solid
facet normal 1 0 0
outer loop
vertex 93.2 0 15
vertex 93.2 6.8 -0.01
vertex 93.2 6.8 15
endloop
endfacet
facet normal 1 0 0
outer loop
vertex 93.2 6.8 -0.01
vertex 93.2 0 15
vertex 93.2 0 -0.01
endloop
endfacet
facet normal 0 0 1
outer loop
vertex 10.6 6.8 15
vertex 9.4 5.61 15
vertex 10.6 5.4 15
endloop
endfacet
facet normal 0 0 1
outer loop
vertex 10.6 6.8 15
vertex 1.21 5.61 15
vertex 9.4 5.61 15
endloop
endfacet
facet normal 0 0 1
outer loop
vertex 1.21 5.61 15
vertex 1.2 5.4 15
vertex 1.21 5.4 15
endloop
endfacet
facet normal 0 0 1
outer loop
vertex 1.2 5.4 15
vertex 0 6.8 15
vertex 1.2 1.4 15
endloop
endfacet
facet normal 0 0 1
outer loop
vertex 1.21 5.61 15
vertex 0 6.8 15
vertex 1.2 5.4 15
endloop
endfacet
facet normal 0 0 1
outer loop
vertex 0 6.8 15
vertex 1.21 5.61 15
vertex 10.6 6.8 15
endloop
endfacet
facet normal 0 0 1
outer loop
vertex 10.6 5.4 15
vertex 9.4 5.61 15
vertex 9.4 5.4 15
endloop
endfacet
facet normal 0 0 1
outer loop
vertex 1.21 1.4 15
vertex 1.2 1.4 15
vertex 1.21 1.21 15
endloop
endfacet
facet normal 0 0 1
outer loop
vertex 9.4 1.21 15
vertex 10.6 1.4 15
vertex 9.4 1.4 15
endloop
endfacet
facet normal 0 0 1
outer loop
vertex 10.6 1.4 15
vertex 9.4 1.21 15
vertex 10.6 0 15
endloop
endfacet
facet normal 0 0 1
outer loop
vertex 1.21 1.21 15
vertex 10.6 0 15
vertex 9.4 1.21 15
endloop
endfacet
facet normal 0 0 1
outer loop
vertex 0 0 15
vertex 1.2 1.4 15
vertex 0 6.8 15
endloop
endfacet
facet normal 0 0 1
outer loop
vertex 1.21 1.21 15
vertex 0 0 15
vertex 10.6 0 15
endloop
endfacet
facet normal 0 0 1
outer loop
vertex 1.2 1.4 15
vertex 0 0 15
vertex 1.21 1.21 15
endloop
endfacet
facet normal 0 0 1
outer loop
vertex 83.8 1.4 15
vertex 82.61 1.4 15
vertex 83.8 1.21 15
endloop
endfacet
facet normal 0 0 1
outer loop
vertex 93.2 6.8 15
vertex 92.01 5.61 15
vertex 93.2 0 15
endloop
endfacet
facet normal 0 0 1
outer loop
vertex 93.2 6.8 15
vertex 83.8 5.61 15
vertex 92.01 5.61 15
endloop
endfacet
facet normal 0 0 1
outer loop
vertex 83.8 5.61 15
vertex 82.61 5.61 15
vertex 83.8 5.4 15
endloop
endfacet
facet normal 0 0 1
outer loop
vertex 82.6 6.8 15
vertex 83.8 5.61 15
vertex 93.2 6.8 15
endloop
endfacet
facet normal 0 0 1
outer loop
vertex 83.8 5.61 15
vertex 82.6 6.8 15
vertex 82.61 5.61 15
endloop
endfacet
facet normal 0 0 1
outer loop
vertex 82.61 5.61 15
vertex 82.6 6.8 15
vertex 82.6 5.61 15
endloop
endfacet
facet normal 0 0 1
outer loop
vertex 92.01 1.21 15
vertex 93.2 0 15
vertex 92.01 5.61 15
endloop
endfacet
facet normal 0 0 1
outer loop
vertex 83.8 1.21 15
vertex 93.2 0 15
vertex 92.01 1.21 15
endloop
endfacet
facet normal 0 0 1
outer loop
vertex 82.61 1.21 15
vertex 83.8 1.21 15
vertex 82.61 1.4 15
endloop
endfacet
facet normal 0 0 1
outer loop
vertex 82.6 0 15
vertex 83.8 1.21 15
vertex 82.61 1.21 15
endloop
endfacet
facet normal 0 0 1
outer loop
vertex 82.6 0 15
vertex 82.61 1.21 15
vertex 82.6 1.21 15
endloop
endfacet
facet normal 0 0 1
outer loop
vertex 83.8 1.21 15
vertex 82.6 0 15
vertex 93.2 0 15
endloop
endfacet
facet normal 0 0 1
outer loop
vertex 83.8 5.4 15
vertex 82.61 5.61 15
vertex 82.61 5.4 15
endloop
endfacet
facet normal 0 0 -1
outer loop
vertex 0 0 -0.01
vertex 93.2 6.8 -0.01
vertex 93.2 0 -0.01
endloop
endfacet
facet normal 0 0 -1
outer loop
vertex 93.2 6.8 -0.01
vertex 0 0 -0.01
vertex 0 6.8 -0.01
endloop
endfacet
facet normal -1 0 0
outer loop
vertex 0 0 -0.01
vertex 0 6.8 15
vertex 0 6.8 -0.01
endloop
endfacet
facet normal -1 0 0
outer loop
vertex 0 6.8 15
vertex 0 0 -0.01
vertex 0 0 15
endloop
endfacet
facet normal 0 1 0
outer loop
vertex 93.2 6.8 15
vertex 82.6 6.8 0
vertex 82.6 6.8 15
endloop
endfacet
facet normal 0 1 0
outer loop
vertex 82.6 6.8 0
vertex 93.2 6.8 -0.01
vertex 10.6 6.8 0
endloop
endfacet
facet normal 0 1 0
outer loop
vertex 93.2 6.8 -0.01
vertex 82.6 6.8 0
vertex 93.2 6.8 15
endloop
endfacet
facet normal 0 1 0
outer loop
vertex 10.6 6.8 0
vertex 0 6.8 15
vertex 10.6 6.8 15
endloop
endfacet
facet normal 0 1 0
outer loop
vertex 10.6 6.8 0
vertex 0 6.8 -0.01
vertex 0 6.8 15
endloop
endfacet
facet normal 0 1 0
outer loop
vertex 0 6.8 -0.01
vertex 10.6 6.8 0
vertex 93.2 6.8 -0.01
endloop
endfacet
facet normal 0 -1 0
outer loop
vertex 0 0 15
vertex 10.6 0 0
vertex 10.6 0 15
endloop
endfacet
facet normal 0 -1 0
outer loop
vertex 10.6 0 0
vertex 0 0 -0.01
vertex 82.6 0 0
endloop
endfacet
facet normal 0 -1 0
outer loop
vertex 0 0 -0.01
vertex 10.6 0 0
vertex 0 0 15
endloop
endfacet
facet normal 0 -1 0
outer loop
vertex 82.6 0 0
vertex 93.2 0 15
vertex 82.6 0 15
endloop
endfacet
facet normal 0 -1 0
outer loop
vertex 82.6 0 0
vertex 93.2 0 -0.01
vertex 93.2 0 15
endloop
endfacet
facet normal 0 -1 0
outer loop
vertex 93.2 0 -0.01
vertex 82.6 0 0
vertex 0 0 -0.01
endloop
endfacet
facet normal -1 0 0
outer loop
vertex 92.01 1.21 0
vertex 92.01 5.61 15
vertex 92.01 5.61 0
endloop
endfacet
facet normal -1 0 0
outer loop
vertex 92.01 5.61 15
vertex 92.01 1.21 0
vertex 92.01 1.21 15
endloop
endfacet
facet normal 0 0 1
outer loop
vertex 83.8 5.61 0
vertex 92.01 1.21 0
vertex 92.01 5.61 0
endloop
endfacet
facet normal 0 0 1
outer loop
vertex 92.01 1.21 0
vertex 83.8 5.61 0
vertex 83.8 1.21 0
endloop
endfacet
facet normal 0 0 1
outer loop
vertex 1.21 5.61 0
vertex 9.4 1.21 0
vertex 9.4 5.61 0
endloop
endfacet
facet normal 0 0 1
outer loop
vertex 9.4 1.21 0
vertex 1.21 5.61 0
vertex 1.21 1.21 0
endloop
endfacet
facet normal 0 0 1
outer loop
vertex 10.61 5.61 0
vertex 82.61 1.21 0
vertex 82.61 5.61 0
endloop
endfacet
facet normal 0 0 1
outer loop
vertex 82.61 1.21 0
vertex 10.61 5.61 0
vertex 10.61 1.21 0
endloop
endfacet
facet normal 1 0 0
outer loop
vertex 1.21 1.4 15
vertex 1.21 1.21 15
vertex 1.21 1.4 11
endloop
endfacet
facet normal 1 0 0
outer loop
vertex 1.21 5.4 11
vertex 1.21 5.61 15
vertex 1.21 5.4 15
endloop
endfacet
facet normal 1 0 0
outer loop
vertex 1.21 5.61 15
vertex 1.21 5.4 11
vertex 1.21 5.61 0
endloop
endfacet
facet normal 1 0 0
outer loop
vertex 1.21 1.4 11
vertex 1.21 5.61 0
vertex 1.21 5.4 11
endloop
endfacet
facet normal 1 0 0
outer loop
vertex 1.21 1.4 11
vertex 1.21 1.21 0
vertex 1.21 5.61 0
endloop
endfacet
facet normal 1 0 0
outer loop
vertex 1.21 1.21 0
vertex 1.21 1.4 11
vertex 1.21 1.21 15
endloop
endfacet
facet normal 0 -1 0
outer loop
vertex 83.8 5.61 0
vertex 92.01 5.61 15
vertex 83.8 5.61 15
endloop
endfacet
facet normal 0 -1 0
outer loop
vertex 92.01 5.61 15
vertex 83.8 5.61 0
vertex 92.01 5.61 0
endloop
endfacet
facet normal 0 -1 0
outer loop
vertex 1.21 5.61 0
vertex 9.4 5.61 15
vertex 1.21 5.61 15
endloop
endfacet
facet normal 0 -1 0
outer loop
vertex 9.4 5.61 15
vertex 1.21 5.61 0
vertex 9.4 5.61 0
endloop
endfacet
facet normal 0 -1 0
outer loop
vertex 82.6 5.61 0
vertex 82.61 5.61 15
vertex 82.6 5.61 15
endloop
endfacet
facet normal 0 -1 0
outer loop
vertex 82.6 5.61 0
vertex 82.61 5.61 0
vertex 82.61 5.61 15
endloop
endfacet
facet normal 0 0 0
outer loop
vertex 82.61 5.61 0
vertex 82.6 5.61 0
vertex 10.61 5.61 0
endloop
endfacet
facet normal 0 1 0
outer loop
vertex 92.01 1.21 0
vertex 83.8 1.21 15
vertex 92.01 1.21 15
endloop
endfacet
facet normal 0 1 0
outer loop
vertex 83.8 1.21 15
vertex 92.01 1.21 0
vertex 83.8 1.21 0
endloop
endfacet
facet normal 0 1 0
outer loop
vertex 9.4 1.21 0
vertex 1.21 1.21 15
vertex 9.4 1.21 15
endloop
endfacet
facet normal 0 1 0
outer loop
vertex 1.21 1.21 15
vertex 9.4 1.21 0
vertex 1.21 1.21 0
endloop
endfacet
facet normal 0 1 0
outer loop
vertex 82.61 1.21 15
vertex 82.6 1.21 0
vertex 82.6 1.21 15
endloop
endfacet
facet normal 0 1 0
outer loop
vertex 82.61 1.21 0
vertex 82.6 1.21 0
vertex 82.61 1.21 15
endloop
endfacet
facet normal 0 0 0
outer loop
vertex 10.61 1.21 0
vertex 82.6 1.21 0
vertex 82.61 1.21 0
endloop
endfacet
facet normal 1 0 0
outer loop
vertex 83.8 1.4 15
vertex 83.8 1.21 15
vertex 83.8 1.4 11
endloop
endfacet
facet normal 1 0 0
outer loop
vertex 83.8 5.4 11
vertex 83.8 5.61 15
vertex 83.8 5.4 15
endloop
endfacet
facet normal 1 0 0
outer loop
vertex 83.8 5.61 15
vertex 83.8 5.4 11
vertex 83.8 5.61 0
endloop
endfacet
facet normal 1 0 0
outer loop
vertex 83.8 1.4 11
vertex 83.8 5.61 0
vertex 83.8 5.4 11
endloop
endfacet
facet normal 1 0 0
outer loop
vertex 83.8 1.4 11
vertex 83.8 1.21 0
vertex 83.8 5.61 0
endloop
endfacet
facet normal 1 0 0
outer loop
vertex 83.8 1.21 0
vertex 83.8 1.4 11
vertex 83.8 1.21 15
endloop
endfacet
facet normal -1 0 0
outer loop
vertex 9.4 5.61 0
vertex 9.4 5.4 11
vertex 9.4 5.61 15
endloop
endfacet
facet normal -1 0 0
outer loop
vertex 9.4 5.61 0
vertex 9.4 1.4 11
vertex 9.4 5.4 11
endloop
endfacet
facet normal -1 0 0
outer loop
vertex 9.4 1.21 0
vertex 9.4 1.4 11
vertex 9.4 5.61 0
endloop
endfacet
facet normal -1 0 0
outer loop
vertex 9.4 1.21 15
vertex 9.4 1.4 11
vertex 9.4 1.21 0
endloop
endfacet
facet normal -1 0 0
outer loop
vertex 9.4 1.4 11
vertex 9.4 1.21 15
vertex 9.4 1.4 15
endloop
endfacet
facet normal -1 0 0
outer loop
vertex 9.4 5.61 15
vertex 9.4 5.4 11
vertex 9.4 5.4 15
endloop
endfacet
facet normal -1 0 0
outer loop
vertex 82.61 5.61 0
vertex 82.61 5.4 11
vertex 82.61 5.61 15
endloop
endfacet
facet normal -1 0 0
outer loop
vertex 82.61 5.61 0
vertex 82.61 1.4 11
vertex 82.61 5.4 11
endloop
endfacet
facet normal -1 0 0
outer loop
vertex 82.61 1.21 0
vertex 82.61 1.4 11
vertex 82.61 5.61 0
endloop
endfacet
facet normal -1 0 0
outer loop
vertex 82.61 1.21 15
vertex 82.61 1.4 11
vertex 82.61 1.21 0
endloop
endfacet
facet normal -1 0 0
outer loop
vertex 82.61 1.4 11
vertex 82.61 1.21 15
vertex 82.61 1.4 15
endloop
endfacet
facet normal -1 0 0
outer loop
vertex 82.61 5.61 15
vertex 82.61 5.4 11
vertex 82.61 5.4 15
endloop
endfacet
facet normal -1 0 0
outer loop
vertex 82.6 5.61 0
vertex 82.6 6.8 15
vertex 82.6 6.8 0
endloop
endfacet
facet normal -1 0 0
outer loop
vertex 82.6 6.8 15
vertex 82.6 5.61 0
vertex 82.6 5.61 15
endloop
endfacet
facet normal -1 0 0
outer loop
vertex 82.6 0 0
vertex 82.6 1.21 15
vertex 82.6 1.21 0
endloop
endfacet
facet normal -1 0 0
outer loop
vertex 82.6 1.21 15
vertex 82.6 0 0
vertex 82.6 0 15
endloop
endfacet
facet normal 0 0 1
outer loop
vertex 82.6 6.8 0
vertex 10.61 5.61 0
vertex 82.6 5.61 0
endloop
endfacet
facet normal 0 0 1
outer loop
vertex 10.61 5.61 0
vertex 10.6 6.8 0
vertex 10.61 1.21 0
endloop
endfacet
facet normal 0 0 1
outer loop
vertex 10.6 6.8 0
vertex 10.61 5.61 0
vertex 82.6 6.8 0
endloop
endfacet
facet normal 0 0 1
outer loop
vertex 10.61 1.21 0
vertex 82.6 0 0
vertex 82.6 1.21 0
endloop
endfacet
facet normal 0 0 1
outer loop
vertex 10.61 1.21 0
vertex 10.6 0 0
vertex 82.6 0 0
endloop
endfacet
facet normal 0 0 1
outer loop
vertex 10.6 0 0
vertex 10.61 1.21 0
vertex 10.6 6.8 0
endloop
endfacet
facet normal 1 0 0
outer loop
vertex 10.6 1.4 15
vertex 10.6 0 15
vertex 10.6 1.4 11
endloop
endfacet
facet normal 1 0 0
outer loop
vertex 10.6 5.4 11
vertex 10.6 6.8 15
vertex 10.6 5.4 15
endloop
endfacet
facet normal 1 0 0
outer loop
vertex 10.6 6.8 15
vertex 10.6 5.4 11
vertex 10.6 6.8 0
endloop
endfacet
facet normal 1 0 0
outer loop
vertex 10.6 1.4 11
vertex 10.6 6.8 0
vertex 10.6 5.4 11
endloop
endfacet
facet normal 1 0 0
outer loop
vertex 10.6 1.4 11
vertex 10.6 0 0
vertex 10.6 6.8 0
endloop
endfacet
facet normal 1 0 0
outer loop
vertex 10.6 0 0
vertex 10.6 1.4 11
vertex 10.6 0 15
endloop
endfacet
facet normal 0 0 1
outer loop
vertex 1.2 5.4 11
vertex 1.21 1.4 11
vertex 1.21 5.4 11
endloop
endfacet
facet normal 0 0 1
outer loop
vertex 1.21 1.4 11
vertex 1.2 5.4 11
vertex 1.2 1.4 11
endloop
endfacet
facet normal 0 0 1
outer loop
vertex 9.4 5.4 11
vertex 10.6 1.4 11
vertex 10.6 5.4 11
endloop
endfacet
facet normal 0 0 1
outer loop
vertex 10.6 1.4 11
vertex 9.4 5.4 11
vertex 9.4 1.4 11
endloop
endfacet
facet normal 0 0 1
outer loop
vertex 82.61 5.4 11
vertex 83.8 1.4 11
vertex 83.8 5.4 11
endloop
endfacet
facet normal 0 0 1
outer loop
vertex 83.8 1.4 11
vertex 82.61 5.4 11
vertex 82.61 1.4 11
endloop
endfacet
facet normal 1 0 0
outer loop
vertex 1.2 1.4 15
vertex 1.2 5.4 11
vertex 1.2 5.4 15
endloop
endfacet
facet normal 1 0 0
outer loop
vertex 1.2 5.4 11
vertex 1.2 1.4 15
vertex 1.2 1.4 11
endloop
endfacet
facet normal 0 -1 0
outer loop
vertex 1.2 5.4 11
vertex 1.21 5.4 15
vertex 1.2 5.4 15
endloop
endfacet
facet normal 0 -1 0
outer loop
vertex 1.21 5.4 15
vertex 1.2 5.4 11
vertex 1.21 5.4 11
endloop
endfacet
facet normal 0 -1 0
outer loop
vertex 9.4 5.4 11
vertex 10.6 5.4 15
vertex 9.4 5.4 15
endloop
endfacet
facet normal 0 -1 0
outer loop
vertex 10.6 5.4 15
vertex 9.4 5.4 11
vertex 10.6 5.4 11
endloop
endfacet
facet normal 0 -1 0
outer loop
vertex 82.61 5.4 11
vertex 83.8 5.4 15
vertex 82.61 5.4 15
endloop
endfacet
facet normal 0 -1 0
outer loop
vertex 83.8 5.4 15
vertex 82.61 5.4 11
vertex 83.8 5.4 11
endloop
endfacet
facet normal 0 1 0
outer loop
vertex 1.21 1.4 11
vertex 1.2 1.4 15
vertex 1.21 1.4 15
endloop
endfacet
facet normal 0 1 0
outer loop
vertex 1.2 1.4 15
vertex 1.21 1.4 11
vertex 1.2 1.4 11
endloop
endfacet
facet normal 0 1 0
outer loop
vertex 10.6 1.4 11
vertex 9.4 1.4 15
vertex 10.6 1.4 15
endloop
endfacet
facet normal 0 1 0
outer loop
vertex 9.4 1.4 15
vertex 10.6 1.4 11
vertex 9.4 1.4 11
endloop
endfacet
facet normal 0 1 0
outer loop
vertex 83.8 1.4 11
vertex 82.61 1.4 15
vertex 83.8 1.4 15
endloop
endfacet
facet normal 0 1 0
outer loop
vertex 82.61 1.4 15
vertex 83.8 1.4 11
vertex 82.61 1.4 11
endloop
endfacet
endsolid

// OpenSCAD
// file: ../Base/Boxes.scad
// Fischertechnik Box Foundation
// Pre-designed Boxes

use <Constants.scad>

include <PlacementOptions.scad>

box190Width = 190;
box190Depth = 130;
box130Width = 130;
box130Depth = 95;

// Values are from an original ec3 box
topBottomDifference = 1.5;
outerHeight = 40;
innerHeight = 38.2;
baseThickness = outerHeight - innerHeight;
stackExcess = 5.7;
radius = 3.5;
wallThickness = 1.5;
tolerance = 0.2;
stackOffset = innerHeight - stackExcess;

boxUsageHeight = stackOffset;
boxWallThickness = wallThickness;
boxBaseThickness = baseThickness;
boxWebWidth = 3.0;

// getBoxWallThickness()
// Gets the wall thickness of a Fischertechnik Box
function getBoxWallThickness() = boxWallThickness;

// getBoxUsageHeight()
// Gets the usable height of a Fischertechnik box
function getBoxUsageHeight() = boxUsageHeight;

// getBoxInnerHeight()
// Gets the inner height of a Fischertechnik box, including the stack excess
function getBoxInnerHeight() = innerHeight;

// getBoxBaseThickness()
// Gets the thickness of the Fischertechnik box base.
function getBoxBaseThickness() = boxBaseThickness;

// getBoxWebWidth()
// Gets the width of a box web
function getBoxWebWidth() = boxWebWidth;

// getBox190Space()
// Gets the usable inner space of a Box 190 as an x/y-list
function getBox190Space() = [
    box190Width - 2*getBoxWallThickness() - topBottomDifference, 
    box190Depth - 2*getBoxWallThickness() - topBottomDifference ];

// BoxBase(width, depth)
// Creates an empty stackable Fischertechnik compatible box
// width = Outer width of the box (190, 130, ...)
// depth = Outer depth of the box (130, 95, ...)

module BoxBase(width, depth, height=outerHeight) {    
    thinPlate = 0.01;

    innerHeight = height - baseThickness;    
    
    module BodyPlate(width, depth) {
        translate([radius, radius])
        hull() {
            w = width-2*radius;
            d = depth-2*radius;
            cube([w, d, thinPlate]);
            cylinder(thinPlate, r=radius, $fn=getFragments());
            translate([w, 0])
                cylinder(thinPlate, r=radius, $fn=getFragments());
            translate([w, d])
                cylinder(thinPlate, r=radius, $fn=getFragments());
            translate([0, d])
                cylinder(thinPlate, r=radius, $fn=getFragments());
        }
    }
    
    module Body(tolerance=tolerance) {
        hull() {
            // Bottom with tolerance to fit into the original boxes when stacked
            translate([-wallThickness+tolerance, -wallThickness+tolerance, -baseThickness])
                BodyPlate(width-topBottomDifference-2*tolerance, depth-topBottomDifference-2*tolerance);
            
            // Top
            translate([-wallThickness-topBottomDifference/2, -wallThickness-topBottomDifference/2, innerHeight-thinPlate])
                BodyPlate(width, depth);
         }
    }

    module Cutoff() {
        hull() {
            coWidth = width - 2*wallThickness;
            coDepth = depth - 2*wallThickness;
            
            // Bottom
            BodyPlate(coWidth-topBottomDifference, coDepth-topBottomDifference);

            // Top
            translate([-topBottomDifference/2, -topBottomDifference/2, innerHeight+thinPlate]) 
                BodyPlate(coWidth, coDepth);
        }
    }
    
    difference() {        
        Body();
        Cutoff();
        stackOffset = innerHeight - stackExcess;
        translate([0, 0, stackOffset + baseThickness])
            Body(tolerance=0);
    }
}

// Creates the Fischertechnik empty box 130x190 mm and places it at position 0,0
// 190x130 are the outer sizes, the inner space is slightly smaller. Use getBox190Space() to get the inner sizes.
// The box is positioned that the usable inner space is at the 0,0,0 position. The

module Box190() {
    BoxBase(box190Width, box190Depth);
}

// Gets the usable inner space of a Box 130 as an x/y-list
function getBox130Space() = [
    box130Width - 2*getBoxWallThickness() - topBottomDifference, 
    box130Depth - 2*getBoxWallThickness() - topBottomDifference ];

// Creates the Fischertechnik empty box 95x130 mm and places it at position 0,0
// 190x130 are the outer sizes, the inner space is slightly smaller. Use getBox190Space() to get the inner sizes.
// The box is positioned that the usable inner space is at the 0,0,0 position. The

module Box130() {
    BoxBase(box130Width, box130Depth);
}

// Creates a web at the specified box walls
// corner 0 = LowerLeft, 1 = UpperLeft, 2 = UpperRight, 3 = LowerRight
// side 0 = LeftOfCorner, 1 = RightOfCorner
// distance = Distance in mm from the corner
// boxSpace = inner width and depth of the box (default: Box 190)
// webWidth = length of the web (default is 3 mms)
// webThickness = thickness of the web (default is 1 mm)

module BoxWeb(corner, side, distance, boxSpace=getBox190Space(), webWidth=getBoxWebWidth(), webThickness=1.0) {
    sink = getBoxWallThickness()/2;

    width = (corner % 2 == 0) ? 
            (side == LeftOfCorner ? webWidth : webThickness) :
            (side == LeftOfCorner ? webThickness : webWidth);

    depth = (corner % 2 == 0) ? 
            (side == RightOfCorner ? webWidth : webThickness) :
            (side == RightOfCorner ? webThickness : webWidth);
    
    xDiff = corner == LowerLeft ? 
                (side == LeftOfCorner ? -sink : distance) :
            (corner == UpperLeft ?                
                (side == LeftOfCorner ? distance : -sink) :
            (corner == UpperRight ?
                (side == LeftOfCorner ? boxSpace.x-webWidth+sink : boxSpace.x-distance-webThickness) :
                (side == LeftOfCorner ? boxSpace.x-distance-webThickness: boxSpace.x-webWidth+sink)));

    yDiff = corner == LowerLeft ? 
                (side == RightOfCorner ? -sink : distance) :
            (corner == UpperLeft ?
                (side == RightOfCorner ? boxSpace.y-distance : boxSpace.y-webWidth+sink) :
            (corner == UpperRight ?
                (side == RightOfCorner ? boxSpace.y-webWidth+sink : boxSpace.y-distance) :
                (side == RightOfCorner ? distance : -sink)));
    
    translate([xDiff, yDiff, -getExcess()])
        cube([width, depth, boxUsageHeight + 2*getExcess()]);
}
// file: ../Base/Rotation.scad
// Fischertechnik Box Foundation
// Geometry Helpers Rotation

include <PlacementOptions.scad>

// getRotatedSpace(space, rotation=NoRotation)
// Rotates the space dependent on the specified rotation

function getRotatedSpace(space, rotation=NoRotation) = [
    (rotation == Rotate90 || rotation == Rotate270) ? space.y : space.x,
    (rotation == Rotate90 || rotation == Rotate270) ? space.x : space.y
];

// Rotates the given space around the fixed left lower corner
// space = the space the children needs as width/depth list [width,depth]
// rotation = 0 Rotate0 degrees, 1 Rotate90 degrees, 2 Rotate180 degrees, 3 Rotate270 degrees (equivalent to -90)

module RotateFix(space, rotation=NoRotation) {
    dy = (rotation == Rotate0 || rotation == Rotate270) ? 0 :
        (rotation == Rotate90) ? space.x :
        space.y;
    dx = (rotation < Rotate180) ? 0 :
        (rotation == Rotate180) ? space.x :
        space.y;
    
    translate([dx, dy, 0])
        rotate([0, 0, rotations[rotation]])
            children();
}
// file: ../Base/Alignment.scad
// Fischertechnik Box Foundation
// Geometry Helpers Alignment

include <PlacementOptions.scad>

// getAlignedX(elementWidth, spaceWidth, align=AlignRight, offset=0)
// Gets the aligned X offset of an element with the given
// width in the given space.
// elementWidth = The width of the element to positon
// spaceWidth = The space where the element should be aligned
// align = 0 AlignLeft, 1 AlignCenter, 2 AlignRight
// offset = an optional offset from the aligned position. When
// aligned left or centered, then positive values are in X direction.
// When aligned right then positive values are in negative X direction.

function getAlignedX(elementWidth, spaceWidth, align=AlignRight, offset=0) =
    (align == AlignLeft) ?
        offset :
        ((align == AlignCenter) ?
        (spaceWidth - elementWidth)/2 + offset :
        spaceWidth - offset - elementWidth);

// getAlignedY(elementDepth, spaceDepth, align=AlignTop, offset=0)
// Gets the aligned Y offset of an element with the given
// depth in the given space.
// elementDepth = The depth of the element to positon
// spaceDepth = The space where the element should be aligned
// align = 0 AlignBottom, 1 AlignCenter, 2 AlignTop
// offset = an optional offset from the aligned position. When
// aligned bottom or centered, then positive values are in Y direction.
// When aligned top then positive values are in negative Y direction.

function getAlignedY(elementDepth, spaceDepth, align=AlignTop, offset=0) =
    (align == AlignBottom) ?
        offset :
        ((align == AlignCenter) ?
        (spaceDepth - elementDepth)/2 + offset :
        spaceDepth - offset - elementDepth);
// file: ../Base/PlacementOptions.scad
// Fischertechnik Box Foundation
// Placement Options

// Alignment
NoAlign = 0;
AlignLeft = 1;
AlignBottom = 2;
AlignCenter = 3;
AlignRight = 4;
AlignTop = 5;

// Element rotation degree steps
rotations = [0, -90, -180, -270];

// Rotation
NoRotation = 0;
Rotate0 = 0;
Rotate90 = 1;
Rotate180 = 2;
Rotate270 = 3;

// Docking (seen from above)
NoDock = -1;
DockLeft = 0;
DockTop = 1;
DockRight = 2;
DockCorner = 2;
DockBottom = 3;

// Web corners
LowerLeft = 0;
UpperLeft = 1;
UpperRight = 2;
LowerRight = 3;

// Web position relative to corner
LeftOfCorner = 0;
RightOfCorner = 1;
// file: ../Base/Placement.scad
// Fischertechnik Box Foundation
// Geometry Helpers Placement

use <Constants.scad>
use <Alignment.scad>
use <Rotation.scad>
use <Boxes.scad>

include <PlacementOptions.scad>

// Place(x=0, y=0, elementSpace=[0,0], alignX=AlignLeft, alignY=AlignBottom, rotation=Rotate0, boxSpace=getBox190Space())
// Places the child at the specified position
// y = Y-Position. This is a relative position when an X aligment is specified.
// x = X-Position. This is a relative position when an Y aligment is specified.
// elementSpace = space of the element to be placed [x,y]
// alignX = -1=NoAlign, 0 AlignLeft, 1 AlignCenter, 3 AlignRight (elementSpace and boxSpace required!)
// alignY = -1=NoAlign, 2 AlignBottom, 1 AlignCenter, 4 AlignTop (elementSpace and boxSpace required!)
// rotation = 0 Rotate0 0 degrees, 1 Rotate90 90 degrees, 
// 2 Rotate180 180 degrees, 3 Rotate270 270 degrees (equivalent to -90)
// boxSpace = Inner space of the box where the placement occurs [x,y] - default is Box 190x130 inner space

module Place(x=0, y=0, elementSpace=[0,0], 
  alignX=AlignLeft, alignY=AlignBottom, 
  rotation=NoRotation, boxSpace=getBox190Space()) {

    module Position(x, y, space, rotation=Rotate0) {
        translate([x, y, 0])
            RotateFix(space, rotation)
                children();
    }

    space = getRotatedSpace(elementSpace, rotation);
    alignedX = getAlignedX(space.x, boxSpace.x, alignX, x);
    alignedY = getAlignedY(space.y, boxSpace.y, alignY, y);
    Position(alignedX, alignedY, elementSpace, rotation)
        children();
}

// Center(space=getBox130Space(), elementSpace=[0,0])
// space = Space where the children is centered. For cylinder use centered=true and no elementSpace.
// elementSpace = space of the element to be centered [x,y]

module Center(space=getBox190Space(), elementSpace=[0,0]) {
    Place(elementSpace=elementSpace, boxSpace=space, alignX=AlignCenter, alignY=AlignCenter)
        children();
}

// CenterHorizontal(width=0, y=0, offset=0, space=getBox130Space())
// width = Width of the element to be placed.
// y = Y position of the element
// offset = Offset from the center position (negative will be left of the center)
// space = Space where the element is placed

module CenterHorizontal(width=0, y=0, offset=0, space=getBox190Space()) {
    Place(x=offset, y=y, elementSpace=[width, 0], boxSpace=space, alignX=AlignCenter)
        children(0);
}

// CenterVertical(depth=0, x=0, offset=0, space=getBox130Space())
// depth = Depth of the element to be placed.
// x = X position of the element
// offset = Offset from the center position (negative will be down of the center)
// space = Space where the element is placed

module CenterVertical(depth=0, x=0, offset=0, space=getBox190Space()) {
    Place(x=x, y=offset, elementSpace=[0, depth], boxSpace=space, alignY=AlignCenter)
        children(0);
}

// getIsVertical(align)
// True if the specified alignment needs a vertical orientation for a divider (AlignRight, AlignLeft)

function getIsVertical(align) = (align == AlignRight || align == AlignLeft);

// getIsHorizontal(align)
// True if the specified alignment needs a horizontal orientation for a divider (AlignTop, AlignBottom)

function getIsHorizontal(align) = (align == AlignTop || align == AlignBottom);
// file: ../Base/Constants.scad
// Fischertechnik Box Foundation
// Constants

// Constant values necessary for multiple elements

// Base constants
dividerThickness = 1.2;
excess = 0.01;
fragments = 90;
tolerance = 0.8;

// Gets the thickness of a divider 
function getDividerThickness() = dividerThickness;

// Gets the excess that is used to merge walls into each other
function getExcess() = excess;

// Gets amount of fragments of a cylinder
function getFragments() = fragments;

// Gets the inner tolerance of a frame to each side
function getTolerance() = tolerance;


// Fischertechnik specific constants
axisDiameter = 4;
axisBottomDiameter = axisDiameter + 1;
axisTolerance = 0.2;

// Gets axis diameter of Fischertechnik axis
function getAxisDiameter() = axisDiameter;

// Gets axis diameter tolerance (subtracted for element axis)
function getAxisTolerance() = axisTolerance;

// Gets the axis diameter for standing axis
function getStandAxisDiameter() = getAxisDiameter() - getAxisTolerance();

// Gets axis bottom diameter for thicker part at the bottom
function getAxisBottomDiameter() = axisBottomDiameter;

standardEdgeDistance = 2.5;
standardWebDistance = 11.5;
standardCornerLength = 15;

// gets the standard distance to the wall of the box for dockable frames with webs
function getStandardEdgeDistance() = standardEdgeDistance;

// gets the standard distance of each web to the corner of the dockable frame
function getStandardWebDistance() = standardWebDistance;

// gets the standard length of the corner walls of a dockable frame
function getStandardCornerLength() = standardCornerLength;

tubeWallFactor = 0.8;

// gets the wall thickness of a tube.
function getTubeWallThickness() = tubeWallFactor * getDividerThickness();

smallPartsFrameHeight = 20;

// gets the frame height for docked small parts boxes.
function getSmallPartsFrameHeight() = smallPartsFrameHeight;

hubRingDiameter = 19.5;
hubRingLevelDiameter = 21;

// gets the diameter of a tube matching the inner ring of a wheel
function getHubRingDiameter() = hubRingDiameter;

// gets the diameter of a hub tube with a thicker diameter
function getHubRingLevelDiameter() = hubRingLevelDiameter;
// main file
// Fischertechnik Box Library
// Frame for single 90 mm Axis
// 31040

use <../ModelBase/Complex.scad>

length = 90;

// getFrameAxis90Space()
// Gets the width (.x) and depth (.y) of the axis frame.

function getFrameAxis90Space() = getFrameAxisSpace(length);

// FrameAxis90()
// Axis holder for a single 90 mm axis.

module FrameAxis90() {
    FrameAxis(length);
}

// Test
color("lightgray")
FrameAxis90();
